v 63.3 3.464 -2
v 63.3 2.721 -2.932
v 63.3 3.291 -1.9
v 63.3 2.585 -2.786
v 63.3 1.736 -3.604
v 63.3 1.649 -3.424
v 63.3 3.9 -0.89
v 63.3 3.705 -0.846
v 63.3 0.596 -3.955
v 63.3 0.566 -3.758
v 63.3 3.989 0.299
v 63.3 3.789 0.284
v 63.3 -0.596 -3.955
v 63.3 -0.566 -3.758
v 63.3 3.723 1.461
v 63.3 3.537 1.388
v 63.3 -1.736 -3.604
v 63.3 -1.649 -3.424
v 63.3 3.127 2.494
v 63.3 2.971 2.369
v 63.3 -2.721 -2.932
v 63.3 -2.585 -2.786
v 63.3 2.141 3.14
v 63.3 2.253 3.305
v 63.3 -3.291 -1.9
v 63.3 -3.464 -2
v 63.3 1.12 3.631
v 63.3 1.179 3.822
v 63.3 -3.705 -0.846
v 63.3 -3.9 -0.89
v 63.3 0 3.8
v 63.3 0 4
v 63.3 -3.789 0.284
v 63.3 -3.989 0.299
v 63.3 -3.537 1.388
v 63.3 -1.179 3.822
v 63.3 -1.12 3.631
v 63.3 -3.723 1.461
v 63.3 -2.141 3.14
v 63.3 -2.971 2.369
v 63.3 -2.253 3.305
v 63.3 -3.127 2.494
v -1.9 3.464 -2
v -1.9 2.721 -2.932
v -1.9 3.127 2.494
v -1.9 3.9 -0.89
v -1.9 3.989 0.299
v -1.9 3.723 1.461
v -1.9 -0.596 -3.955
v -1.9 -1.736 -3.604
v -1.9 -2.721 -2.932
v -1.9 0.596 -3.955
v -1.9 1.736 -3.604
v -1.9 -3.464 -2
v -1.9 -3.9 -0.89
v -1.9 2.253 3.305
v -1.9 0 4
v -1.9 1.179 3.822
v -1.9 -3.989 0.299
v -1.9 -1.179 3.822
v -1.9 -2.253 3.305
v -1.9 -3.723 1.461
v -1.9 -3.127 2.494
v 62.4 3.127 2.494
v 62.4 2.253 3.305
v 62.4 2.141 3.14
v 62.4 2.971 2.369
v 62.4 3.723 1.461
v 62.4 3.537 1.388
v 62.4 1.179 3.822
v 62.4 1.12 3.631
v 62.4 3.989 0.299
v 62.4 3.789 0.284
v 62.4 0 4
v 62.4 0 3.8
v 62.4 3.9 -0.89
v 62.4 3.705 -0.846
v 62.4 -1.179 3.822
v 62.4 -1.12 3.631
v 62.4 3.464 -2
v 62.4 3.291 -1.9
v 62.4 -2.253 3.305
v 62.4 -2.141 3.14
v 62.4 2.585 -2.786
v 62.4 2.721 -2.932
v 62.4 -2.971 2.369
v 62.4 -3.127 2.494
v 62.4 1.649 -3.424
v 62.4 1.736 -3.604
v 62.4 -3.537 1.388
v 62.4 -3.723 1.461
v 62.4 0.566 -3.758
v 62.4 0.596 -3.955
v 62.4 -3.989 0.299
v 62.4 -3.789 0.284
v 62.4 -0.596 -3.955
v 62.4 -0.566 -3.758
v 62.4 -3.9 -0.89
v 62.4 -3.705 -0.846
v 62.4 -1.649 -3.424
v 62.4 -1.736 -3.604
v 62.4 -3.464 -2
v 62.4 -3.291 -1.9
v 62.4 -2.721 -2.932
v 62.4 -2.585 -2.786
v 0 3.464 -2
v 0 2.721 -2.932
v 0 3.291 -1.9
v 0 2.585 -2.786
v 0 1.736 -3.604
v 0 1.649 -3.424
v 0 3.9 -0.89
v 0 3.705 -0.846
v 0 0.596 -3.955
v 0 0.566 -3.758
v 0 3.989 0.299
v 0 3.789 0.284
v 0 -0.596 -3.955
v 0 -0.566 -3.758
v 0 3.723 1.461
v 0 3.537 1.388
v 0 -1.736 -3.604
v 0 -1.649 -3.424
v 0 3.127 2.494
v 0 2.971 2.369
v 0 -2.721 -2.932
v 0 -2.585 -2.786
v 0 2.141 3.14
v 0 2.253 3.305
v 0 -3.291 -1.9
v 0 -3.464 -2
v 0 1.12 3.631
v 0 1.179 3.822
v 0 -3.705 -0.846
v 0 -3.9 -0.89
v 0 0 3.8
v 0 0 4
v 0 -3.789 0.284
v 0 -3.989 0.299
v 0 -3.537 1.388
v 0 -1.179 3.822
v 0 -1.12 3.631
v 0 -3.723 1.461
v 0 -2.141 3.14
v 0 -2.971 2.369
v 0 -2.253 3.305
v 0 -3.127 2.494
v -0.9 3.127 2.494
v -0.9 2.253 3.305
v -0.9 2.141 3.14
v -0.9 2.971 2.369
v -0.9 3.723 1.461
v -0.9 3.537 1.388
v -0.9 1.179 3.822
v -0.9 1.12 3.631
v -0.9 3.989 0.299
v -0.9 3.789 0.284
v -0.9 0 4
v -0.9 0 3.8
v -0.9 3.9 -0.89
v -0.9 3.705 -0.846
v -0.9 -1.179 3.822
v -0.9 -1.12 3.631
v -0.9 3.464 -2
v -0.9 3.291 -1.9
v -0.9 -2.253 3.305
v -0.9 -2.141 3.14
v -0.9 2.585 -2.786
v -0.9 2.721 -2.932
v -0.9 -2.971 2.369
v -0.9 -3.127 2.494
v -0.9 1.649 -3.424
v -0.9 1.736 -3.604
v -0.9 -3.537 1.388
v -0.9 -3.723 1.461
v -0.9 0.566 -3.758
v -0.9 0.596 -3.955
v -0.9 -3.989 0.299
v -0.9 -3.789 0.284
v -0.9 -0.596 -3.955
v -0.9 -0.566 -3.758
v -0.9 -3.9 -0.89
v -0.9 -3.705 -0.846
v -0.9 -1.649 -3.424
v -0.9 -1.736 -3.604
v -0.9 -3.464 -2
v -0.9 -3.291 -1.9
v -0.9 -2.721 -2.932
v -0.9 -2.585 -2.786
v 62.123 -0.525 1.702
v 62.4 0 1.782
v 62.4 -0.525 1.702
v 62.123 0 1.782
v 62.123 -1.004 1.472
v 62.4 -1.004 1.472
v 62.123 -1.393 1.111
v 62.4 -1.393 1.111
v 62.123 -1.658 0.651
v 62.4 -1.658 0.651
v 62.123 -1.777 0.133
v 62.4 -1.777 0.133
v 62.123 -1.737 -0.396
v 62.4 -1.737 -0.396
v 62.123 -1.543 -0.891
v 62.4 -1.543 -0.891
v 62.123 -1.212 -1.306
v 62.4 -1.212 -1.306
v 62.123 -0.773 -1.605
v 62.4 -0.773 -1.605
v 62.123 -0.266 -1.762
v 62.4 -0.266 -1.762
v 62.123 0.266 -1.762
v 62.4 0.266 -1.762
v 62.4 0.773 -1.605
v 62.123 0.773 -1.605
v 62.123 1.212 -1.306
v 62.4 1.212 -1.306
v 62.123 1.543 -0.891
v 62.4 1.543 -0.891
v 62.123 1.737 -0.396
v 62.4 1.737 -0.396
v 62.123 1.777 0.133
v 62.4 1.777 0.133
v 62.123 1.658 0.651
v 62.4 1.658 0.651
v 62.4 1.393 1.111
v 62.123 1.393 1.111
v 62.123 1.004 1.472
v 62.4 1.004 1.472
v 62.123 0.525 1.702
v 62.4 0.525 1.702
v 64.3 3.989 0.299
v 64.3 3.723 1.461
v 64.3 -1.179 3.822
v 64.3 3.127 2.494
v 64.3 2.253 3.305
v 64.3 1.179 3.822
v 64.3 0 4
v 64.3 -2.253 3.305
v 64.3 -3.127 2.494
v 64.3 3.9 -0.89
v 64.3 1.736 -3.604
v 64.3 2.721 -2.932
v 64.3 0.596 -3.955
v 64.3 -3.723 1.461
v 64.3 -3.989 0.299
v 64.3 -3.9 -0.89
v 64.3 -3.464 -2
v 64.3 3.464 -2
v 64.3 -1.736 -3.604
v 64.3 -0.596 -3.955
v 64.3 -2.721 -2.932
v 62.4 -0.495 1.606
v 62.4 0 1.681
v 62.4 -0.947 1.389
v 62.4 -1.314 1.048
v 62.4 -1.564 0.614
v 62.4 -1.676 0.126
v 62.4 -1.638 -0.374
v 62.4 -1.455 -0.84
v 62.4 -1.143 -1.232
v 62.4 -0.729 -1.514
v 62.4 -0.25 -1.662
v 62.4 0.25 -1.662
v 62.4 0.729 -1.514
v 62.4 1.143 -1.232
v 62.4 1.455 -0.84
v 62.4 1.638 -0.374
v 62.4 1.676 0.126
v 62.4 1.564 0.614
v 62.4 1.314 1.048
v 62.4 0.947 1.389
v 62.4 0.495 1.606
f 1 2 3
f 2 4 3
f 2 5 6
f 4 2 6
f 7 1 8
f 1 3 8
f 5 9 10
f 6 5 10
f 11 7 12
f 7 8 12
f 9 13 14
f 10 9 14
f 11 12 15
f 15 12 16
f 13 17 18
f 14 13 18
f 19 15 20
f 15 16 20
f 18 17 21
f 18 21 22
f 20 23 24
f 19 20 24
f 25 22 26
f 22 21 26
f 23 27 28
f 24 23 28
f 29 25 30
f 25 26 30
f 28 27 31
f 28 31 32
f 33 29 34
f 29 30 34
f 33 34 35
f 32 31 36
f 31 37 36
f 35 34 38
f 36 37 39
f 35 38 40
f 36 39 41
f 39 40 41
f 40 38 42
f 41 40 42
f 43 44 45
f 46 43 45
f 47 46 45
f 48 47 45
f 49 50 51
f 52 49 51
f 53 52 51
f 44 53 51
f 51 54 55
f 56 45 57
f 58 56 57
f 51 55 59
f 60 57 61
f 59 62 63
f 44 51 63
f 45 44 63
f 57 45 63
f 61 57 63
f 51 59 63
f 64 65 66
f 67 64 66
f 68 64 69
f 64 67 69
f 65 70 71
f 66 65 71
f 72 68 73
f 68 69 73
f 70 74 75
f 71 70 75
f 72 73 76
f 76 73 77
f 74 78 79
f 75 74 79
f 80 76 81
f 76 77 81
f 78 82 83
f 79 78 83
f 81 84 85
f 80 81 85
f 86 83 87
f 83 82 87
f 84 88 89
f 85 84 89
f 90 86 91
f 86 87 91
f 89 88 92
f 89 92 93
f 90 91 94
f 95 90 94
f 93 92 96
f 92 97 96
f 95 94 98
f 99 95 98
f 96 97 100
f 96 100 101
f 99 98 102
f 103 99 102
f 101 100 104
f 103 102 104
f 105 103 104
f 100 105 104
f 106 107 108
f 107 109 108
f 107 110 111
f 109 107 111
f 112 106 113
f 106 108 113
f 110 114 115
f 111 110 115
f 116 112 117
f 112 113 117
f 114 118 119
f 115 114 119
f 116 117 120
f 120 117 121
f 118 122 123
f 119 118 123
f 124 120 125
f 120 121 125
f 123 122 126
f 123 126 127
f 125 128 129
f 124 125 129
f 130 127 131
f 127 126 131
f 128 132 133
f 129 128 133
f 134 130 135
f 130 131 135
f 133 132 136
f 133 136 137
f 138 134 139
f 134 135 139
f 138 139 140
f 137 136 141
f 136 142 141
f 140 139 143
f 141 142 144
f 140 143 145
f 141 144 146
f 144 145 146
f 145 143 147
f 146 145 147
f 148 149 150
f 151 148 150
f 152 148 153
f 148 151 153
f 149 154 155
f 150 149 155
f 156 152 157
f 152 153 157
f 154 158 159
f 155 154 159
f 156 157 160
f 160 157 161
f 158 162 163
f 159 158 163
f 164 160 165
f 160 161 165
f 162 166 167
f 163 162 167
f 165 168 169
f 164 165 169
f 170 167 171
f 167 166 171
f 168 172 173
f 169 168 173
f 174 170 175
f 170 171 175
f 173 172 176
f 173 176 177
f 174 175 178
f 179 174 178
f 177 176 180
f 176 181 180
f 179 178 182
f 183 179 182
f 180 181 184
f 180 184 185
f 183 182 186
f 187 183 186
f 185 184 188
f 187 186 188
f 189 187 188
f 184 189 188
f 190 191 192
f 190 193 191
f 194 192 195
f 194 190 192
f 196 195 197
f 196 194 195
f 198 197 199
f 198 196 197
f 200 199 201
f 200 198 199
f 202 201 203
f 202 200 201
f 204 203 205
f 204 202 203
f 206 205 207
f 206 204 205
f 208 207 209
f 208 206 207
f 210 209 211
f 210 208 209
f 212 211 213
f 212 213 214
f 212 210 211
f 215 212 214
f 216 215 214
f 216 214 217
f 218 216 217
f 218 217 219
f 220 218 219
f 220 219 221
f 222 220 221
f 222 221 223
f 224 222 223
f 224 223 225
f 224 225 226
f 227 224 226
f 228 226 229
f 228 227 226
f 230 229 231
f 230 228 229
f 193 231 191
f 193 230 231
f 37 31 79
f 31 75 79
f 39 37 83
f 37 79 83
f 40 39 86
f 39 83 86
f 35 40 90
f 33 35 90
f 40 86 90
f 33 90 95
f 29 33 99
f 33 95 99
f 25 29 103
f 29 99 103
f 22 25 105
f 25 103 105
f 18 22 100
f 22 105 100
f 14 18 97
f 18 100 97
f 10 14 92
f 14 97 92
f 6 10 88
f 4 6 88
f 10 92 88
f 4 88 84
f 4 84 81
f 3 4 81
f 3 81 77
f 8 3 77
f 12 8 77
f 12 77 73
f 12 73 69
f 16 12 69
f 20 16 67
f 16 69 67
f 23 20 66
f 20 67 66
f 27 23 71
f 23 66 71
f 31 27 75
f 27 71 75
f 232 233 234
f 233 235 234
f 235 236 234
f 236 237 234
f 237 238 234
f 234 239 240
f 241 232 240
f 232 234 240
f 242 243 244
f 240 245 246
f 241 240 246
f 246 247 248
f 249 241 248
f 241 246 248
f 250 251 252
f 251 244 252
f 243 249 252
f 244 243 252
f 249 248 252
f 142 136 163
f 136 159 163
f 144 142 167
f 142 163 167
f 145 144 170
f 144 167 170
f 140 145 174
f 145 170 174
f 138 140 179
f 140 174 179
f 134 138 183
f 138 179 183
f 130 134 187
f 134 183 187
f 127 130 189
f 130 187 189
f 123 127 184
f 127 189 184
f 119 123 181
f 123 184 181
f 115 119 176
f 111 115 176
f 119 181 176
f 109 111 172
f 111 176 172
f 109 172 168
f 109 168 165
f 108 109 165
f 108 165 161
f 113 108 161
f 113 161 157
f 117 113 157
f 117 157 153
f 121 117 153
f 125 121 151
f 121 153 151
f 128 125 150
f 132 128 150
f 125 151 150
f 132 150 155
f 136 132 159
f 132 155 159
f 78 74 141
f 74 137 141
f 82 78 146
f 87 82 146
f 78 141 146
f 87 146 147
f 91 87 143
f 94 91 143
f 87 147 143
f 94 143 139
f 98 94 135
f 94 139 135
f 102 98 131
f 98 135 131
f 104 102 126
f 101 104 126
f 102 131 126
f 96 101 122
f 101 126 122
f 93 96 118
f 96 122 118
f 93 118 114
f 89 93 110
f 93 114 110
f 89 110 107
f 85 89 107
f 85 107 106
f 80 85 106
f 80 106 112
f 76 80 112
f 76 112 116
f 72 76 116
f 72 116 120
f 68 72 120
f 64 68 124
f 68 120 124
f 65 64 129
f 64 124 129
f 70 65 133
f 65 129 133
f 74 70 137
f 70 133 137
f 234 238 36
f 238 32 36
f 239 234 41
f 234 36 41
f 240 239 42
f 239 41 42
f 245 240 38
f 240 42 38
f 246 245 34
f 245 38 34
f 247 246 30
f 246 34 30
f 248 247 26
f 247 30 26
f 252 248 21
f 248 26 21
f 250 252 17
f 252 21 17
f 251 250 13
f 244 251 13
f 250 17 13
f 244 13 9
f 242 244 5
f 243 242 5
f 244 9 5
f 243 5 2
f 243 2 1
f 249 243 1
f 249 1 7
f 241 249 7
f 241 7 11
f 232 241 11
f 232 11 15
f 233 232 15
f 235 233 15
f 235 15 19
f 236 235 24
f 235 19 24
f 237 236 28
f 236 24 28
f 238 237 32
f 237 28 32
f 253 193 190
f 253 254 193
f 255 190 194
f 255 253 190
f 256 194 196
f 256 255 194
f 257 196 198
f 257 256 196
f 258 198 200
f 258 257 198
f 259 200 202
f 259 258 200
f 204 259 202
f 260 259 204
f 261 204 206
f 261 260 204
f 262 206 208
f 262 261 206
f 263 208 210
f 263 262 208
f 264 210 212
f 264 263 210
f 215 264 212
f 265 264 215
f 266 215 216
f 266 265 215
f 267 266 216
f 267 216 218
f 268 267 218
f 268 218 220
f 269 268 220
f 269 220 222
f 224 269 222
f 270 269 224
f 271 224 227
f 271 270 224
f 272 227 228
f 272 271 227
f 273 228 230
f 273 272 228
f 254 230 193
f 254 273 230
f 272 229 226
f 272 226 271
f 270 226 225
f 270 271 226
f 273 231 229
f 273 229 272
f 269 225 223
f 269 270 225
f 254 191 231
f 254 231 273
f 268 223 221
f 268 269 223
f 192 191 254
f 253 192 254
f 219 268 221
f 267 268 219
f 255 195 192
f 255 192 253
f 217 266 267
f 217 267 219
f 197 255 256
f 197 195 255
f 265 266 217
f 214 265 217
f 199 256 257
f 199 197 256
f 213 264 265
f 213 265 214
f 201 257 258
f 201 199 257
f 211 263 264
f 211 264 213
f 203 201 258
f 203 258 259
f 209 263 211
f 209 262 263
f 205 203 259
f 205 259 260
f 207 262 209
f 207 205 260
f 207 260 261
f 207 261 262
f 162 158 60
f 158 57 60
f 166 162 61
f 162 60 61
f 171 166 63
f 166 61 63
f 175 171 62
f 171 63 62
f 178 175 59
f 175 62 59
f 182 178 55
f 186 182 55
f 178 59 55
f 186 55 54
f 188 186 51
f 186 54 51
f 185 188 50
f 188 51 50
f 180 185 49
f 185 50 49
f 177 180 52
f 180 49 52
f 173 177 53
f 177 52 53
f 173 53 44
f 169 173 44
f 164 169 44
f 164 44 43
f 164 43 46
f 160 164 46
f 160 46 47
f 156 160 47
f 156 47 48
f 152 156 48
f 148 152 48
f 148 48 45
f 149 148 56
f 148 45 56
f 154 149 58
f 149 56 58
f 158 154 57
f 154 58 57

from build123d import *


with BuildPart() as part:
    # Sketch1 → Revolve1 (revolve)
    with BuildSketch(Plane.XY, mode=Mode.PRIVATE) as revolve1_sk:
        Polygon((-1.9, 4), (-1.9, 0), (0, 0), (62.4, 0), (64.3, 0), (64.3, 4), (63.3, 4), (63.3, 3.8), (62.4, 3.8), (62.4, 4), (0, 4), (0, 3.8), (-0.9, 3.8), (-0.9, 4), align=None)
        Polygon((62.4, 1.680571503), (62.4, 1.781506728), (62.123398622, 1.781506728), align=None, mode=Mode.SUBTRACT)
    revolve(revolve1_sk.sketch.rotate(Axis((0, 0, 0), (1, 0, 0)), 90), axis=Axis((0, 0, 0), (1, 0, 0)))


solid = part.part
